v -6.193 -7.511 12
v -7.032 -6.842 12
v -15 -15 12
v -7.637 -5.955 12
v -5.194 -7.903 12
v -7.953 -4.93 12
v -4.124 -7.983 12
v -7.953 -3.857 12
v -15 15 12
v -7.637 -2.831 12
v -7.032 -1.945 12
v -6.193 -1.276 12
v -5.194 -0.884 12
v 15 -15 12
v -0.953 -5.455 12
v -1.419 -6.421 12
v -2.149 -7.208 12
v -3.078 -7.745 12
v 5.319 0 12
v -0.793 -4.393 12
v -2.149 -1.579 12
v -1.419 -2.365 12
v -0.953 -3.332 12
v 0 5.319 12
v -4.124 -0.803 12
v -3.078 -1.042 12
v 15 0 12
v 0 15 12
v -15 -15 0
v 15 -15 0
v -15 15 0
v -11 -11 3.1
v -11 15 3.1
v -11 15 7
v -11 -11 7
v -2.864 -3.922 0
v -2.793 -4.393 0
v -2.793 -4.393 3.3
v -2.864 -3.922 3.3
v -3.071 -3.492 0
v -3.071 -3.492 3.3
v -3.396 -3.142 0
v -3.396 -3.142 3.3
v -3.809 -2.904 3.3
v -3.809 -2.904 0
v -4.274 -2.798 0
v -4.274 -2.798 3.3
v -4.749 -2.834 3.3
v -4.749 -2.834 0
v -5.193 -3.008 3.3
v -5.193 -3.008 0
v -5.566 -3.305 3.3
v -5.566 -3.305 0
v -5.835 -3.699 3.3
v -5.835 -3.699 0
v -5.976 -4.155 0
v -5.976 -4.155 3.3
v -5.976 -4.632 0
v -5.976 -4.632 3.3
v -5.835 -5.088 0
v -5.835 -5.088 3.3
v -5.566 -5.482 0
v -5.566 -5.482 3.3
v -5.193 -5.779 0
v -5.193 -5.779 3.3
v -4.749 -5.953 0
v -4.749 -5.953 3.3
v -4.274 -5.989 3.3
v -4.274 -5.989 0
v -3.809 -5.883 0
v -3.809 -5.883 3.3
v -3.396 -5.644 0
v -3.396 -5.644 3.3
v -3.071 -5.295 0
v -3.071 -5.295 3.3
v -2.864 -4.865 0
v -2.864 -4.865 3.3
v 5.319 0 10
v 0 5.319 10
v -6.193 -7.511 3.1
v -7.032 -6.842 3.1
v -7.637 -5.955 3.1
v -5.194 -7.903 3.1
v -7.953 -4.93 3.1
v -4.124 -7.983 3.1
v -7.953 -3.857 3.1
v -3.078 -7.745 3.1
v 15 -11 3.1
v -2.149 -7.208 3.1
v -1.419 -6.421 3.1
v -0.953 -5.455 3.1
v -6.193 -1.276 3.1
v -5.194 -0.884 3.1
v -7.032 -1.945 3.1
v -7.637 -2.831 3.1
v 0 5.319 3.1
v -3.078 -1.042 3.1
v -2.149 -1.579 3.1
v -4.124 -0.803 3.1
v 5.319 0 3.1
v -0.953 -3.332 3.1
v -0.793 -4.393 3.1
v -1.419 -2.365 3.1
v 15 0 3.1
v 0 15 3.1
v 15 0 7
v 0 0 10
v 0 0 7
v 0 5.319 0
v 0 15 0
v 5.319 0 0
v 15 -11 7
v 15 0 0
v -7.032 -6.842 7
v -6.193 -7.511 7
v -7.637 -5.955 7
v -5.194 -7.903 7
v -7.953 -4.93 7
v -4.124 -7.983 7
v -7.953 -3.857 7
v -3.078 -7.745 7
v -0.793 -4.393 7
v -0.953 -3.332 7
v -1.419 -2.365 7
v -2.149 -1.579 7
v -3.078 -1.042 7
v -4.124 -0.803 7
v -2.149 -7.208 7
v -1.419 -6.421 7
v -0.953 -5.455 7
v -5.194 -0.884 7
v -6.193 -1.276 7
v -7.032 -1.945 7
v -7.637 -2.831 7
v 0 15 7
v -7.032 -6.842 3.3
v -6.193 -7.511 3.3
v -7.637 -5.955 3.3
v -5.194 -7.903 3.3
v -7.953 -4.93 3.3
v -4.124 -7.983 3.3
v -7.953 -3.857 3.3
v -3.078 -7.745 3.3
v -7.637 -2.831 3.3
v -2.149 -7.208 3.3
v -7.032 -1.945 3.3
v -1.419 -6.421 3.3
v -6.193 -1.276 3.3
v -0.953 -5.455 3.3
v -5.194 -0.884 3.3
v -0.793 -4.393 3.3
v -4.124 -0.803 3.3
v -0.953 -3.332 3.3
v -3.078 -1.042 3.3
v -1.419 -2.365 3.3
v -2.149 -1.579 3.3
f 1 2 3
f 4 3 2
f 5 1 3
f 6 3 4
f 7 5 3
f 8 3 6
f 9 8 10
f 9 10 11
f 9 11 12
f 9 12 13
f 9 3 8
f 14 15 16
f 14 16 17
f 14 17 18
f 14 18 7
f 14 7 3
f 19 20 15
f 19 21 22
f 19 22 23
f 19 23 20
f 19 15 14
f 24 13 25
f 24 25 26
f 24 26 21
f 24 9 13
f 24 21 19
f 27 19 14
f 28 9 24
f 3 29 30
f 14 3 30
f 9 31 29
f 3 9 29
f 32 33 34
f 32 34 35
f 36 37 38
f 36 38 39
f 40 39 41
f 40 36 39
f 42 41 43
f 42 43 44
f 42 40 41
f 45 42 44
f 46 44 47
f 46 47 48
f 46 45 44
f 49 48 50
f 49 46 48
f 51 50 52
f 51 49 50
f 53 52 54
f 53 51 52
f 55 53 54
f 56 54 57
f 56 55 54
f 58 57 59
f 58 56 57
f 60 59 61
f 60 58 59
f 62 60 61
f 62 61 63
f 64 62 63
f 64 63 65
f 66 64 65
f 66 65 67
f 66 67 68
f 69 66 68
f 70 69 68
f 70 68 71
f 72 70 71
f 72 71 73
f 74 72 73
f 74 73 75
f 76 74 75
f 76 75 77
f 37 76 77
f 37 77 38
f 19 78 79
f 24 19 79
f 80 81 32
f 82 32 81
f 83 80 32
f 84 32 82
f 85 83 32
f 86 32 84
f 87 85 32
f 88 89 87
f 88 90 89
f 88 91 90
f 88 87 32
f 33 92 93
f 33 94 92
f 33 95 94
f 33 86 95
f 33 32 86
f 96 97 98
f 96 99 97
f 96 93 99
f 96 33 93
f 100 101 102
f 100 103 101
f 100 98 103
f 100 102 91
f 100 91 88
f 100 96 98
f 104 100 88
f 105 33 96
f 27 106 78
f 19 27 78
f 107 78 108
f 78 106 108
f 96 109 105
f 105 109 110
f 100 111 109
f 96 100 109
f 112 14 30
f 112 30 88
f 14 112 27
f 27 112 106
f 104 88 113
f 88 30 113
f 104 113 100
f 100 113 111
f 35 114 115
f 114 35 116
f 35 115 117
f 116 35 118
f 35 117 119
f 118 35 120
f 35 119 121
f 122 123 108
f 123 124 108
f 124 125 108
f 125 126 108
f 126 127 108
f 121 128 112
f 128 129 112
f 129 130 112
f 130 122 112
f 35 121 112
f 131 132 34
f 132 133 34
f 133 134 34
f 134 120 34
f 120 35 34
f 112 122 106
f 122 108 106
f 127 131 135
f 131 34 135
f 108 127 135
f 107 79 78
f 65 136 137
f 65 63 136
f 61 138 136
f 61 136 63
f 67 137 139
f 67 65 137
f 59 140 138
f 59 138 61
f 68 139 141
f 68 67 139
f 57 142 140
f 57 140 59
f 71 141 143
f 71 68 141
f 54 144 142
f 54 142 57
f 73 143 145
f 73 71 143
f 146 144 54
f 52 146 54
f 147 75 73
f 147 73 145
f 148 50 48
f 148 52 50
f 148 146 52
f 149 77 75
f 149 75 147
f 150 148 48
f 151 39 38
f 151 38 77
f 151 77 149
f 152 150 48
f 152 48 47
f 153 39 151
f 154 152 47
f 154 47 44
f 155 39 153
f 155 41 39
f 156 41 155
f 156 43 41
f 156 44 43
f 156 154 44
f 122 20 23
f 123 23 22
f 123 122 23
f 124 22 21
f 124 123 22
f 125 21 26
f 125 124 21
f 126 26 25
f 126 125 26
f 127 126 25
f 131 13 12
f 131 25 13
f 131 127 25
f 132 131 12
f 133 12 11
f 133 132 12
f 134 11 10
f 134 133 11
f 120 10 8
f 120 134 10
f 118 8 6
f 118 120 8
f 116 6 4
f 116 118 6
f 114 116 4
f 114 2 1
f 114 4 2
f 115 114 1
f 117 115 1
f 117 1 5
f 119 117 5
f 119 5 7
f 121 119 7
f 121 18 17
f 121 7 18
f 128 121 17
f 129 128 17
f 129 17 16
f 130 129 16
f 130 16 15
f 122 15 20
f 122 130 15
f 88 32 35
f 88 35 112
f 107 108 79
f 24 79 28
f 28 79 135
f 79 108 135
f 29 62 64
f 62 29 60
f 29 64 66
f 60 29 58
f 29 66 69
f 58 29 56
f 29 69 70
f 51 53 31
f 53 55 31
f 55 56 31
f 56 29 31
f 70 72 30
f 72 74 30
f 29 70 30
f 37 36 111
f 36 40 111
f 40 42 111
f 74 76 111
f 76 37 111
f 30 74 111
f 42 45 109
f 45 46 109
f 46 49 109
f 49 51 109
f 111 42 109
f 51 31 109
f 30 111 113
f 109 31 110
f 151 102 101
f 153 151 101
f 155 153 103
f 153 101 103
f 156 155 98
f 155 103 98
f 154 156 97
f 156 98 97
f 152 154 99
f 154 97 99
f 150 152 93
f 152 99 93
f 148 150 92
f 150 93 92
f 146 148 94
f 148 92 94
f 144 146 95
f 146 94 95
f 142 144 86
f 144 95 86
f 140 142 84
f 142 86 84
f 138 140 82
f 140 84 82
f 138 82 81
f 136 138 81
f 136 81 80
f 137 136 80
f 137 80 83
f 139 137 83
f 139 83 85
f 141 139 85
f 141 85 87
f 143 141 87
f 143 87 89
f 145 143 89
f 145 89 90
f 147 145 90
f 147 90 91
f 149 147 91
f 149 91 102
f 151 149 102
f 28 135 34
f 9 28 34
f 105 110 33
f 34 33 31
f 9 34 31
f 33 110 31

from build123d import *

# Parameters (mm, degrees)
F0_W     = 4
F0_H     = 15
F0_W_2   = 11
F0_H_2   = 11
F0_R     = 3.6
F0_H_3   = 4
F0_R_2   = 1.6
F1_DEPTH = 12
F2_START = 3.1
F2_DEPTH = 3.9
F3_START = 5
F3_DEPTH = 5
F4_START = 3.3
F4_DEPTH = 19.2


# Not quite as in the source:
# - a feature names something its author has since deleted; it is built from what else it names


with BuildPart() as f1:
    # F0 (on Top) → F1 (new body)
    with BuildSketch(Plane.XY):
        with Locations((-13, 7.5)):
            Rectangle(F0_W, F0_H)
        Polygon((-11, 0), (0, 0), (0, 5.31885653), (0, 15), (-7, 15), (-11, 15), align=None)
        Polygon((0, -11), (15, -11), (15, -7), (15, 0), (5.31885653, 0), (0, 0), align=None)
        Polygon((2.9605122421, -15), (15, -15), (15, -11), (0, -11), (0, -15), align=None)
        with Locations((-5.5, -5.5)):
            Rectangle(F0_W_2, F0_H_2)
        with Locations((-4.3933982822, -4.3933982822)):
            Circle(F0_R, mode=Mode.SUBTRACT)
        Polygon((0, 5.31885653), (0, 0), (5.31885653, 0), align=None)
        with Locations((-13, -13)):
            Rectangle(F0_W, F0_H_3)
        Polygon((-15, -11), (-11, -11), (-11, 0), (-15, 0), (-15, -7), align=None)
        with Locations((-5.5, -13)):
            Rectangle(F0_W_2, F0_H_3)
        with Locations((-4.3933982822, -4.3933982822)):
            Circle(F0_R)
        with Locations((-4.3933982822, -4.3933982822)):
            Circle(F0_R_2, mode=Mode.SUBTRACT)
    extrude(amount=F1_DEPTH)

    # F0 (on Top) → F2 (cut)
    with BuildSketch(Plane.XY.offset(F2_START)):
        Polygon((0, -11), (15, -11), (15, -7), (15, 0), (5.31885653, 0), (0, 0), align=None)
        with Locations((-5.5, -5.5)):
            Rectangle(F0_W_2, F0_H_2)
        with Locations((-4.3933982822, -4.3933982822)):
            Circle(F0_R, mode=Mode.SUBTRACT)
        Polygon((-11, 0), (0, 0), (0, 5.31885653), (0, 15), (-7, 15), (-11, 15), align=None)
        Polygon((0, 5.31885653), (0, 0), (5.31885653, 0), align=None)
    extrude(amount=F2_DEPTH, mode=Mode.SUBTRACT)

    # F0 (on Top) → F3 (cut)
    with BuildSketch(Plane.XY.offset(F3_START)):
        Polygon((0, 5.31885653), (0, 0), (5.31885653, 0), align=None)
    extrude(amount=F3_DEPTH, mode=Mode.SUBTRACT)

    # F0 (on Top) → F4 (cut)
    with BuildSketch(Plane.XY.offset(F4_START)):
        with Locations((-4.3933982822, -4.3933982822)):
            Circle(F0_R)
        with Locations((-4.3933982822, -4.3933982822)):
            Circle(F0_R_2, mode=Mode.SUBTRACT)
    extrude(amount=F4_DEPTH, mode=Mode.SUBTRACT)


solid = f1.part
